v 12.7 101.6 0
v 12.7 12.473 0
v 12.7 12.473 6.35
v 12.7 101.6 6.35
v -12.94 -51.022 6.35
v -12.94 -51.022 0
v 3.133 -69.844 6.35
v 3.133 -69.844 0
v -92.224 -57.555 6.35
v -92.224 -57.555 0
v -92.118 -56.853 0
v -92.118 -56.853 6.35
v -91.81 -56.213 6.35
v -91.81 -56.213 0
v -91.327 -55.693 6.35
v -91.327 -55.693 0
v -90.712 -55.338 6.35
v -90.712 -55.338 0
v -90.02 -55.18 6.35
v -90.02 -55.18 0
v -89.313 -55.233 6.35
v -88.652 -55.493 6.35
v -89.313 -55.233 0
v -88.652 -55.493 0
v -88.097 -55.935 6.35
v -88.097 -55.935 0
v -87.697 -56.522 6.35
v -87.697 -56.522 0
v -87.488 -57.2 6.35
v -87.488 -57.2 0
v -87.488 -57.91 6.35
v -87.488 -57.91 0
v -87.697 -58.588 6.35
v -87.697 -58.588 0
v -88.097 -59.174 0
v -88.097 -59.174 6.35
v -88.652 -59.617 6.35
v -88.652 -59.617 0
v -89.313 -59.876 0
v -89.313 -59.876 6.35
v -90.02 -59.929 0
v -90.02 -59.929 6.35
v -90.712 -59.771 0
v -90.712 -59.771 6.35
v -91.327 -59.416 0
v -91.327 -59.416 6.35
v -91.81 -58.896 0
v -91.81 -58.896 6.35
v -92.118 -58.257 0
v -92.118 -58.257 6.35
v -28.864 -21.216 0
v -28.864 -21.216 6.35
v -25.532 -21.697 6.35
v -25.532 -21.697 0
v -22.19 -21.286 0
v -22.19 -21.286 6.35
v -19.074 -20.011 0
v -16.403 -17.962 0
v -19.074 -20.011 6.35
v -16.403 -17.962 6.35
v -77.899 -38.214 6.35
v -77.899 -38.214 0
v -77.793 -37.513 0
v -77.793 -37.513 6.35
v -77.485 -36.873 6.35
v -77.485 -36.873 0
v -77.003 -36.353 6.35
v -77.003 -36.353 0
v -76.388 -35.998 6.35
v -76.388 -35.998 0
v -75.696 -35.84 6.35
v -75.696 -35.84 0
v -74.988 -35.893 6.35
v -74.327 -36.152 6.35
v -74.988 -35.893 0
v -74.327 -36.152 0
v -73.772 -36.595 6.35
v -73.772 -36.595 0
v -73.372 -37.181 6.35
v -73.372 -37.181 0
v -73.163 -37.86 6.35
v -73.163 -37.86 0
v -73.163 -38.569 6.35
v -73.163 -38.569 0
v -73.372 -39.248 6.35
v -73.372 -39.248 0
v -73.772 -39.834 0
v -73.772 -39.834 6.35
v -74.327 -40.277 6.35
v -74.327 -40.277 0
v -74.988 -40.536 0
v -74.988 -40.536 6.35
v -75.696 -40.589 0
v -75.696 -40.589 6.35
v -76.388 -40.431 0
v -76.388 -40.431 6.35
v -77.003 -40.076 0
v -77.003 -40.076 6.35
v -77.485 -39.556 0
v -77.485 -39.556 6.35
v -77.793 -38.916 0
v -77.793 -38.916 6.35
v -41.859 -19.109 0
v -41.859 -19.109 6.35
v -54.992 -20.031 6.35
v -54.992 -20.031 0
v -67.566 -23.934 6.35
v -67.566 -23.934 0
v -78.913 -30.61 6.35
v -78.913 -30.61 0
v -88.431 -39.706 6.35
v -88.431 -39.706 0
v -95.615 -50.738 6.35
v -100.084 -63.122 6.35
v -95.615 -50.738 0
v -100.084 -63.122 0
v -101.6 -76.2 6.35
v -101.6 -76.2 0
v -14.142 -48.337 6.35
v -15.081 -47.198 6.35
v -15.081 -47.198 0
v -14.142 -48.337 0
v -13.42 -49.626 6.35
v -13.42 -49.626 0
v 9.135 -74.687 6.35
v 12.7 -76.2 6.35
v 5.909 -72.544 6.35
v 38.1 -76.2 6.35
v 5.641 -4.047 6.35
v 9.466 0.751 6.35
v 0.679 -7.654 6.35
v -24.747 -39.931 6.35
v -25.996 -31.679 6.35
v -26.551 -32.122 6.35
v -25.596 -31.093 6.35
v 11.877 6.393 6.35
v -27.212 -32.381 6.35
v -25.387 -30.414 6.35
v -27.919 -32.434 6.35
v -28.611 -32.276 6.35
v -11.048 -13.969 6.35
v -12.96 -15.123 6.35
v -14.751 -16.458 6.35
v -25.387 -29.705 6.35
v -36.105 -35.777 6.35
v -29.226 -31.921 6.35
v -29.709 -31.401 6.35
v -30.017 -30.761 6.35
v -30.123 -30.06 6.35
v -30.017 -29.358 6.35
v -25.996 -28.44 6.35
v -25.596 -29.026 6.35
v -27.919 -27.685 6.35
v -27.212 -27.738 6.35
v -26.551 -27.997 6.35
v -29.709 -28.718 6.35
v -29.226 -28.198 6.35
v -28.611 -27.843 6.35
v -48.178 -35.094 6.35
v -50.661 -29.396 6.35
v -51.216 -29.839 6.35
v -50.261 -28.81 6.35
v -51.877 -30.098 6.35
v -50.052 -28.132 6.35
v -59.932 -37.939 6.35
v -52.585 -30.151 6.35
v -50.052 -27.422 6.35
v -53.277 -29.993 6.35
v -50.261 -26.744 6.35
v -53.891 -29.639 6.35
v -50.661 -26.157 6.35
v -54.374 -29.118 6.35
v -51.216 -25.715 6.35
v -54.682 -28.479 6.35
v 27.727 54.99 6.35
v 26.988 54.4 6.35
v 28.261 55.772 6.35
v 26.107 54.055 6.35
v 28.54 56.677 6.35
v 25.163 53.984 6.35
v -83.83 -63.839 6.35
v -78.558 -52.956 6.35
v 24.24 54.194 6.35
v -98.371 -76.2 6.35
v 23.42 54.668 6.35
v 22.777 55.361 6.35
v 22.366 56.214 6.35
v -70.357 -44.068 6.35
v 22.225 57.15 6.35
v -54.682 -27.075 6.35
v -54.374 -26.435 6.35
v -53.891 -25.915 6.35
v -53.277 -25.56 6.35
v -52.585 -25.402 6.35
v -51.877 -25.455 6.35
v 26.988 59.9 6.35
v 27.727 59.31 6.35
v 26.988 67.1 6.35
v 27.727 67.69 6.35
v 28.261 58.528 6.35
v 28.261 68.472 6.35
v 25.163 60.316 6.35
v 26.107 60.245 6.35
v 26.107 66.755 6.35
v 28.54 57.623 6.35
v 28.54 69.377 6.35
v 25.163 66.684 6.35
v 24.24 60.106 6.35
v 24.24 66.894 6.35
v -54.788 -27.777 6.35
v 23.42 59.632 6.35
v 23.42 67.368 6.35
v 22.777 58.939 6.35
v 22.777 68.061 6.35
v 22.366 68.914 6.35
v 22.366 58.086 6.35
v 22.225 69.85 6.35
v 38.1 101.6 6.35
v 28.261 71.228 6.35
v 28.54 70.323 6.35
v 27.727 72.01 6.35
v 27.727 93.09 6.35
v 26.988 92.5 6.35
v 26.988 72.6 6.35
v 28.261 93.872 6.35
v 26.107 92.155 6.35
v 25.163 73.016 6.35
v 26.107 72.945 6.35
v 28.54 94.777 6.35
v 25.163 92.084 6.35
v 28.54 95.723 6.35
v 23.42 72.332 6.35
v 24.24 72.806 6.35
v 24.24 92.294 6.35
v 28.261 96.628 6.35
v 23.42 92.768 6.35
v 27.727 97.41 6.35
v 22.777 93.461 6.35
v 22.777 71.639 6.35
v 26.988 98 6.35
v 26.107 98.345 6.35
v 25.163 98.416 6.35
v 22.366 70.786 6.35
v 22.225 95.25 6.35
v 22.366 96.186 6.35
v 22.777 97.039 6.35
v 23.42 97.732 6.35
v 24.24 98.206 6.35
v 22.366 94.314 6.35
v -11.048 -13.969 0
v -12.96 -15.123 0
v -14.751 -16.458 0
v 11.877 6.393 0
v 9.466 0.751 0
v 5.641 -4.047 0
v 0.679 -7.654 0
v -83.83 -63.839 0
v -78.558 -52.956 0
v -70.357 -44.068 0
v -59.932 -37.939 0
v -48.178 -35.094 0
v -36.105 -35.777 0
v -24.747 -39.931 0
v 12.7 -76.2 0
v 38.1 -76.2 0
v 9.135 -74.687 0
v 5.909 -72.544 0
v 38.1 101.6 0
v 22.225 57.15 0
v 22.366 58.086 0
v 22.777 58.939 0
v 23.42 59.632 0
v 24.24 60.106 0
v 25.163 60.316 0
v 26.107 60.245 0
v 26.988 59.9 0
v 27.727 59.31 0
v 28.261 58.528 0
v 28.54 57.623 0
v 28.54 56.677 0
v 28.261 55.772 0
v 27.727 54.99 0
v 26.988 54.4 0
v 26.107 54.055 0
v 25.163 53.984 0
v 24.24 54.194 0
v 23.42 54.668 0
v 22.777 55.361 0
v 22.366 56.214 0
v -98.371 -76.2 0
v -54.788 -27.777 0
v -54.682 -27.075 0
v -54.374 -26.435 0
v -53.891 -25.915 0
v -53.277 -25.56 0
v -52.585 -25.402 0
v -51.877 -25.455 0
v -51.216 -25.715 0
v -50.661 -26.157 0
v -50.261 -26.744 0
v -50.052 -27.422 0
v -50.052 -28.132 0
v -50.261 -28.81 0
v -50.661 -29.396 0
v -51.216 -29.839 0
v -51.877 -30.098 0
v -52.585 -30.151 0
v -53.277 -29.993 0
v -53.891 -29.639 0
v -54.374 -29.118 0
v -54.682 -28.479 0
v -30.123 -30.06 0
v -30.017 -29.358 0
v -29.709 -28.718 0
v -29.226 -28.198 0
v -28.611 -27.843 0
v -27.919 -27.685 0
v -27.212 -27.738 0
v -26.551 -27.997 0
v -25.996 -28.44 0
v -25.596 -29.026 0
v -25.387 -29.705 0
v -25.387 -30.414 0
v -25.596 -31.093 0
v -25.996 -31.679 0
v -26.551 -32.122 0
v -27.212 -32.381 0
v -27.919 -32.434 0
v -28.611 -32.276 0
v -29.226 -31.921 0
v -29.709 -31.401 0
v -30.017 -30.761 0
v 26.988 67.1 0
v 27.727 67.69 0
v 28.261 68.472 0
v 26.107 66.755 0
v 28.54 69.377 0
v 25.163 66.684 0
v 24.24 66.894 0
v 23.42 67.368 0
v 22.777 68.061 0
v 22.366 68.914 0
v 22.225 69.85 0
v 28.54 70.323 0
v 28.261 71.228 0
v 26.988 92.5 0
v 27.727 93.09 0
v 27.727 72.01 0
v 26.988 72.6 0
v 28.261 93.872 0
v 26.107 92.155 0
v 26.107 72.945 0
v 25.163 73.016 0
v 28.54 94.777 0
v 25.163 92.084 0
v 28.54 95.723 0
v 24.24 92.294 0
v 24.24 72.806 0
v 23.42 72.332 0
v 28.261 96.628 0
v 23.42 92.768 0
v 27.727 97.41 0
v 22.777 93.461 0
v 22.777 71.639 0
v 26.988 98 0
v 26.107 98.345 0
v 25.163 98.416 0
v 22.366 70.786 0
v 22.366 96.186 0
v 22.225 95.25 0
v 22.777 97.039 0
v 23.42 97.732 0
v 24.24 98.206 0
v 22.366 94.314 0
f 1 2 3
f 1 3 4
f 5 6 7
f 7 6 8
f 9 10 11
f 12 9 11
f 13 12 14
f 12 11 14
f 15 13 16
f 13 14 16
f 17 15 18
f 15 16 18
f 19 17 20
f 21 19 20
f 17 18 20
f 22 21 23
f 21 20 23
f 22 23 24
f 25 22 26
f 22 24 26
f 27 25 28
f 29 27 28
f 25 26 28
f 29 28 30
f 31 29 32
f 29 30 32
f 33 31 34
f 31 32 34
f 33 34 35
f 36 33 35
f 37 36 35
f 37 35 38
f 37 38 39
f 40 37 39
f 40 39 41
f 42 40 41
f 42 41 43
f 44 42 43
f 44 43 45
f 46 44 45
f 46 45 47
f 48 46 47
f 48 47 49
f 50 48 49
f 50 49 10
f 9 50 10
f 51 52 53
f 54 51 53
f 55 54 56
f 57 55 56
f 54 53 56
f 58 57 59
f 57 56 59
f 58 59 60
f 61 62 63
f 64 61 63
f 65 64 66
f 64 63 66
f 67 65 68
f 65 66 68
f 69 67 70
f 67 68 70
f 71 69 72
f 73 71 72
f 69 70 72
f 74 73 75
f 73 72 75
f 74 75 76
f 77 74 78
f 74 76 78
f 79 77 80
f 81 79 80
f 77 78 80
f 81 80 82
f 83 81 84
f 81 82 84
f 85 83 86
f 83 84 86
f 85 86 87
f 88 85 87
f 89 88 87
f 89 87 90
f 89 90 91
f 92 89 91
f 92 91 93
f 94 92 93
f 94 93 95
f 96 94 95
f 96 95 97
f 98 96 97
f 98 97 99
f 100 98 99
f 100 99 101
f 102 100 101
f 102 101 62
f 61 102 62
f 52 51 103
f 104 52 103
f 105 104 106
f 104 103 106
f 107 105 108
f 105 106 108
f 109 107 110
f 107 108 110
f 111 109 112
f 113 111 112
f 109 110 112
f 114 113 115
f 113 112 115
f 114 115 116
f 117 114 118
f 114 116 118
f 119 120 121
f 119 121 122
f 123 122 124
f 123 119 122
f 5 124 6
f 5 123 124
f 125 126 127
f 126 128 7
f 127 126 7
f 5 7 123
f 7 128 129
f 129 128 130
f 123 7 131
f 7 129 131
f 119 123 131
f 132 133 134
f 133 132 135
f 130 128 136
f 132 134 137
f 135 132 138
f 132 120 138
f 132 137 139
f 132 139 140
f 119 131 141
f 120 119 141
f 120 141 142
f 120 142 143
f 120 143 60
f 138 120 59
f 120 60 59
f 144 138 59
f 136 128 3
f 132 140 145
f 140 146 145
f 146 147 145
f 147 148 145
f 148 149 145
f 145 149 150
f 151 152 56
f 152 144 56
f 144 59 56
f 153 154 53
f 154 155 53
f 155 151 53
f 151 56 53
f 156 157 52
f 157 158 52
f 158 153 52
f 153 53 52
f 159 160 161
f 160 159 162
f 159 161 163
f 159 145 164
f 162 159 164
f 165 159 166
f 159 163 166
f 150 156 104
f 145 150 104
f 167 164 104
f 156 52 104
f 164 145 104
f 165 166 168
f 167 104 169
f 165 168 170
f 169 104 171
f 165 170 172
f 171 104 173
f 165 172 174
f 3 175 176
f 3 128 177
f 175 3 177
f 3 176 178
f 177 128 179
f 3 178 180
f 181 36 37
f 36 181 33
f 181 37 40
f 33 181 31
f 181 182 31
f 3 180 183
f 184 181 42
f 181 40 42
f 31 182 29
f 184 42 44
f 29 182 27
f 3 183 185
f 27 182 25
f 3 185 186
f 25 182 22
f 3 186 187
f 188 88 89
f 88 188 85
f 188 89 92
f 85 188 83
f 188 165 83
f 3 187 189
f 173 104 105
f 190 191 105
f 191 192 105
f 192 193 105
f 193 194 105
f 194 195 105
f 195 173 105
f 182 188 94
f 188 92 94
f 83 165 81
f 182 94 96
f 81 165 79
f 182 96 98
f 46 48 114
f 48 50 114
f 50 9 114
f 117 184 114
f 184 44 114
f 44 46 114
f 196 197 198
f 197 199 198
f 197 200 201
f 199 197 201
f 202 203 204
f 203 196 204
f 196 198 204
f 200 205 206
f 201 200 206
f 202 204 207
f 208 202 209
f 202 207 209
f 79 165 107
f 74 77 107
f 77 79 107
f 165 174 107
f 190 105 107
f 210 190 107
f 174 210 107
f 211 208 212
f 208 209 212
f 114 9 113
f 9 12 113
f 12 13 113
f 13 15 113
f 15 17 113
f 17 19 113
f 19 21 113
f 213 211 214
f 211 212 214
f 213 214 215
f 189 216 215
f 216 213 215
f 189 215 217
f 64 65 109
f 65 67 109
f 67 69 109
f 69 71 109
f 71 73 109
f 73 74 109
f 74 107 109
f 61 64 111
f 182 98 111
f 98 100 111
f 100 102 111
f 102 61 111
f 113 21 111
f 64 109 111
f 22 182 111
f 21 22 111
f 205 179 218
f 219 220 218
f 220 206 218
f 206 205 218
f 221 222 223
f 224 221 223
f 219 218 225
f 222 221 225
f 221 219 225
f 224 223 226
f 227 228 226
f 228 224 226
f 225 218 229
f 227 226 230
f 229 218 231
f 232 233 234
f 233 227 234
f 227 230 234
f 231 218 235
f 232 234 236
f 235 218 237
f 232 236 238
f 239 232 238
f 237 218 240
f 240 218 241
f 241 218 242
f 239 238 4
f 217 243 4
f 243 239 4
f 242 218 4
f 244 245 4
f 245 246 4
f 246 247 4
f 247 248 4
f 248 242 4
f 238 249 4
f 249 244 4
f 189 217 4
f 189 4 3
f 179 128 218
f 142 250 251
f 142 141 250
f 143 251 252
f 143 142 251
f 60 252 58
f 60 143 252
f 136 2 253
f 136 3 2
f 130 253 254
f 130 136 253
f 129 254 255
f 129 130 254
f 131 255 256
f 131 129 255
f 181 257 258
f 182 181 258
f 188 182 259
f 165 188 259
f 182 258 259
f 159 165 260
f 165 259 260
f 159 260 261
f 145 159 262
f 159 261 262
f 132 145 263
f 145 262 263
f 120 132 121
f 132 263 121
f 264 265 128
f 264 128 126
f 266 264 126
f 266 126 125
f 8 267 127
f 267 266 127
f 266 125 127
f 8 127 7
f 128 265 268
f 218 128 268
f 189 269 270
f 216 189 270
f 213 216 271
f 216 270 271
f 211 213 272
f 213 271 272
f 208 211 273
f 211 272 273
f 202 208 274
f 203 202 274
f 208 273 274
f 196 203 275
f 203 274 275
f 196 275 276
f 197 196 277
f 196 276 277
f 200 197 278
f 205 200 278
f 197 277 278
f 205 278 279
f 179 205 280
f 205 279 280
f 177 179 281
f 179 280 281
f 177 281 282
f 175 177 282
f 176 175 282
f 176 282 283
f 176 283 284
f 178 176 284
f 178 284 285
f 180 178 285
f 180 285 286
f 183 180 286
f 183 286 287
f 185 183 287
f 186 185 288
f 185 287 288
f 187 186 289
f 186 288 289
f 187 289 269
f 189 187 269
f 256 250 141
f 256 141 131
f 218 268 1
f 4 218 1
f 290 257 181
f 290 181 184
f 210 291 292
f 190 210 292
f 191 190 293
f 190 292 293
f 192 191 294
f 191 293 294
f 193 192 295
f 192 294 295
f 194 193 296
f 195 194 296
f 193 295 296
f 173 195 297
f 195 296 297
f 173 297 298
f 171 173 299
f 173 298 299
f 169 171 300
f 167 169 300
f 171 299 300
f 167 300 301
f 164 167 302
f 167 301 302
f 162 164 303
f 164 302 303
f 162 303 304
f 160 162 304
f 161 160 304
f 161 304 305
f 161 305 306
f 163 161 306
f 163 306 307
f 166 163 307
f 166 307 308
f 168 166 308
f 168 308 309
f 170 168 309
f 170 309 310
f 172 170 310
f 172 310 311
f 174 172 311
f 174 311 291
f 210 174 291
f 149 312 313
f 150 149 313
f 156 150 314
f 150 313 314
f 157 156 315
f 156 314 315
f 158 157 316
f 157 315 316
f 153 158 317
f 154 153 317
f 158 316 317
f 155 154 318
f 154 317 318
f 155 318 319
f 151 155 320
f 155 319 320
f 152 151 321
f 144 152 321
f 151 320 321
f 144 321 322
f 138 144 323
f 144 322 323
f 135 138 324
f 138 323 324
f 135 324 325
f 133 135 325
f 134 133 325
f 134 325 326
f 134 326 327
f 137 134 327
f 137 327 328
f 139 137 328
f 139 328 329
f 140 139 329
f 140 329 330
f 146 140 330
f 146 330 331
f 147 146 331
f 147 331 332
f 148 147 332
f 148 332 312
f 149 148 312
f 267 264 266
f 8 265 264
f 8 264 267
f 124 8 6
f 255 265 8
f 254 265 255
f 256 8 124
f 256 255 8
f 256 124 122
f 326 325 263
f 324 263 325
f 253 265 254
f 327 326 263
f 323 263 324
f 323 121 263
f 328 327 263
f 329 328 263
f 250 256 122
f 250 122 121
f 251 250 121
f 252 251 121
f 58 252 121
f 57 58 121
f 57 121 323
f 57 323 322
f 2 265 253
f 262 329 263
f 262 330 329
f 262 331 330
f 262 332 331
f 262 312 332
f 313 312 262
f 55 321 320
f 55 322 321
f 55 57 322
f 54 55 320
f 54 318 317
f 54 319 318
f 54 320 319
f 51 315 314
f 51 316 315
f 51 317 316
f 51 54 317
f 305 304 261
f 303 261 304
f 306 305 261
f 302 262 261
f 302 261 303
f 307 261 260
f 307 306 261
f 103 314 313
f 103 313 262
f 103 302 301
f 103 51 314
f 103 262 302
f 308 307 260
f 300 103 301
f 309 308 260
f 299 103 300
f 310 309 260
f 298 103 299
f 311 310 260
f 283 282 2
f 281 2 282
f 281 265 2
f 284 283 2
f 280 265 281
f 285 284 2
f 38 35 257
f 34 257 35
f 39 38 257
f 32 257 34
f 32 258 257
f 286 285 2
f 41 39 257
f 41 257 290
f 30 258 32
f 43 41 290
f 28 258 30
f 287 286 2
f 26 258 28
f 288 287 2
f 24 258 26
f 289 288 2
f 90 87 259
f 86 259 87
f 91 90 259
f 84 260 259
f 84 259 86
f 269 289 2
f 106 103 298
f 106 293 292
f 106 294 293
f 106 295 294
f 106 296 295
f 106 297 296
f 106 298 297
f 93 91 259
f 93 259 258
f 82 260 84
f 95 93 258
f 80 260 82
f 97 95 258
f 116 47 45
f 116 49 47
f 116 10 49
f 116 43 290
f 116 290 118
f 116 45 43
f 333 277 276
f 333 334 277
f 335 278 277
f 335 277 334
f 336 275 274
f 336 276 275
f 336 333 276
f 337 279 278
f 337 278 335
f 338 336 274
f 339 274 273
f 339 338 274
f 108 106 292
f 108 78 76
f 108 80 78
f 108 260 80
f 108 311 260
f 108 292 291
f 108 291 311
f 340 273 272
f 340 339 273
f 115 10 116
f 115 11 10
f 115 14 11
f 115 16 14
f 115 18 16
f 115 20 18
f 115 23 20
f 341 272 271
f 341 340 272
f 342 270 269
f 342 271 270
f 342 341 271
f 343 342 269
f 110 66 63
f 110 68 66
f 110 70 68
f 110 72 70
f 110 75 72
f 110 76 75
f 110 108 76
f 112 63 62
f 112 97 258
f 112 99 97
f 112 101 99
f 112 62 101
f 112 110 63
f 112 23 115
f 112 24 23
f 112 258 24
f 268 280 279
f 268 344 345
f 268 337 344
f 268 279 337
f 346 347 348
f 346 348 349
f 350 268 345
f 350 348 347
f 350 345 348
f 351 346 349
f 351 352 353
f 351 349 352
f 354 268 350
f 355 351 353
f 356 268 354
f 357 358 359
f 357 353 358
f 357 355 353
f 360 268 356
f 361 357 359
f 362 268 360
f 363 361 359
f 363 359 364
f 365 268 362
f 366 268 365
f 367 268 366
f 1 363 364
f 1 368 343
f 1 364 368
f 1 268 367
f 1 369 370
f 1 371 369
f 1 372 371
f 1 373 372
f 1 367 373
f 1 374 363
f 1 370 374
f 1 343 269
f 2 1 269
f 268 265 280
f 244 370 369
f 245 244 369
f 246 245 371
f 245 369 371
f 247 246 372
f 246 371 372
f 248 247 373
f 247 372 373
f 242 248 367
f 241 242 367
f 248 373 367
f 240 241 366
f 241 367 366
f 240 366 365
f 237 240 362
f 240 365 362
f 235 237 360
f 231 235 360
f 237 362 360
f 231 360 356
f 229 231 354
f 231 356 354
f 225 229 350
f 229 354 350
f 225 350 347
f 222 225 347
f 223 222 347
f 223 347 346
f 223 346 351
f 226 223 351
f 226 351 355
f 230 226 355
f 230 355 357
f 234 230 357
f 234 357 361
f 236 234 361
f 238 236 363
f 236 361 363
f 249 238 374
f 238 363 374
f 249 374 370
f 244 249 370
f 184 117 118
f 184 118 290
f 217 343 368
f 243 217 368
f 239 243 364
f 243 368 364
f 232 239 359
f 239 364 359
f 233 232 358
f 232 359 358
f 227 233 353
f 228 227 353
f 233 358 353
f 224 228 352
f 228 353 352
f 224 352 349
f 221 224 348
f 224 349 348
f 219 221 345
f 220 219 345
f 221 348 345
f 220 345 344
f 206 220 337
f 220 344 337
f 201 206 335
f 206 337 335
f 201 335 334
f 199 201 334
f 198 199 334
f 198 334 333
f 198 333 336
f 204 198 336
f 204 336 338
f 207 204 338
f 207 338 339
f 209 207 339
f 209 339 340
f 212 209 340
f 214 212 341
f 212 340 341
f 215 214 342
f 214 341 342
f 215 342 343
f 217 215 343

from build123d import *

# Parameters (mm, degrees)
BOSS_EXTRUDE1_DEPTH = 6.35
FILLET1_R           = 8.255
SKETCH2_R           = 3.175
CUT_EXTRUDE1_DEPTH  = 128.158650905
CHAMFER2_START      = -126.7457463
CHAMFER2_OUTLINE_W  = 36
CHAMFER2_OUTLINE_H  = 6.35
CHAMFER2_DEPTH      = 83.771913248
FILLET4_R           = 20.955
FILLET5_R           = 12.7
SKETCH3_W           = 25.4
SKETCH3_H           = 25.4
SKETCH3_R           = 3.175
BOSS_EXTRUDE2_DEPTH = 6.35
SKETCH4_W           = 25.4
SKETCH4_H           = 177.8
SKETCH4_R           = 3.175
BOSS_EXTRUDE3_DEPTH = 6.35
SKETCH5_W           = 25.4
SKETCH5_H           = 101.6
CUT_EXTRUDE2_DEPTH  = 144.824345992
CHAMFER3_DEPTH      = 6.35
FILLET7_R           = 22.86
SKETCH6_R           = 2.38125
CUT_EXTRUDE3_DEPTH  = 144.824345992


with BuildPart() as part:
    # Sketch1 → Boss-Extrude1 (new body)
    with BuildSketch(Plane.XY):
        with BuildLine():
            Line((12.7, 76.2), (-12.7, 76.2))
            Line((-12.7, 76.2), (-12.7, -28.680951188))
            ThreePointArc((-12.7, -28.680951188), (-71.390768363, -25.798437524), (-101.6, -76.2))
            Line((-101.6, -76.2), (-85.725, -76.2))
            ThreePointArc((-85.725, -76.2), (-58.470420375, -37.379213847), (-12.7, -49.826469235))
            Line((-12.7, -49.826469235), (-12.7, -76.2))
            Line((-12.7, -76.2), (12.7, -76.2))
            Line((12.7, -76.2), (12.7, 76.2))
        make_face()
    extrude(amount=BOSS_EXTRUDE1_DEPTH)

    # Fillet1
    fillet1_edges = [part.edges().sort_by_distance(p)[0] for p in [
        (-12.7, -49.826469235, 3.175),
    ]]
    fillet(fillet1_edges, radius=FILLET1_R)

    # Chamfer1
    # the kernel refuses this chamfer: 16.925734726, 15.24 mm, written as the material it takes off along each edge
    with BuildSketch(Plane(origin=(-85.725, -76.2, -32.922584323), x_dir=(0.15149402541241913, 0.9884581732498049, 0), z_dir=(0, 0, 1))) as chamfer1_piece_1:
        with BuildLine():
            Line((13.017434015, -0.44343203), (-2.4273823, 12.943386903))
            Line((-2.4273823, 12.943386903), (-2.761989917, 12.89210395))
            ThreePointArc((-2.761989917, 12.89210395), (-1.331569383, 6.453627085), (-0.334607617, -0.051282954))
            Line((-0.334607617, -0.051282954), (0.051282954, -0.334607617))
            ThreePointArc((0.051282954, -0.334607617), (6.510978775, 0.137060785), (12.966151061, -0.778039646))
            Line((12.966151061, -0.778039646), (13.017434015, -0.44343203))
        make_face()
    extrude(amount=72.195168646, mode=Mode.SUBTRACT)

    # Sketch2 → Cut-Extrude1 (cut, through all)
    with BuildSketch(Plane.XY.offset(6.35)):
        with Locations((0, 57.15)):
            Circle(SKETCH2_R)
        with Locations((0, 69.85)):
            Circle(SKETCH2_R)
    extrude(amount=-CUT_EXTRUDE1_DEPTH, mode=Mode.SUBTRACT)

    # Chamfer2: read off the stored shape, not the designer's step
    # Chamfer2 outline → Chamfer2 (cut)
    with BuildSketch(Plane(origin=(0, 0, 0), x_dir=(0.6493951635681026, -0.7604511302735748, 0), z_dir=(0.7604511302735747, 0.6493951635681027, 0)).offset(CHAMFER2_START)):
        with Locations((47, -3.175)):
            Rectangle(CHAMFER2_OUTLINE_W, CHAMFER2_OUTLINE_H)
    extrude(amount=CHAMFER2_DEPTH, mode=Mode.SUBTRACT)

    # Fillet4
    # the kernel refuses this fillet: 20.955 mm, written as the material it takes off along each edge
    with BuildSketch(Plane(origin=(8.560811014, -76.2, 27.244649936), x_dir=(1, 0, 0), z_dir=(0, 0, -1))) as fillet4_piece_1:
        with BuildLine():
            CenterArc((10.50769959, -19.963819717), FILLET4_R, 107.692818626, 31.811166067)
            Line((-5.427553845, -6.355744064), (-5.746258914, -6.083582551))
            Line((-5.746258914, -6.083582551), (-0.318705069, 0.272161513))
            Line((-0.318705069, 0.272161513), (0, 0.4191))
            ThreePointArc((0, 0.4191), (2.069594493, 0.4191), (4.011818774, 0.399276394))
            Line((4.011818774, 0.399276394), (4.139188986, 0))
        make_face()
    extrude(amount=48.139299873, mode=Mode.SUBTRACT)

    # Fillet5
    fillet5_edges = [part.edges().sort_by_distance(p)[0] for p in [
        (-12.7, -28.680951188, 3.175),
    ]]
    fillet(fillet5_edges, radius=FILLET5_R)

    # Sketch3 → Boss-Extrude2 (add)
    with BuildSketch(Plane.XY.offset(6.35)):
        with Locations((0, 88.9)):
            Rectangle(SKETCH3_W, SKETCH3_H)
        with Locations((0, 95.25)):
            Circle(SKETCH3_R, mode=Mode.SUBTRACT)
    extrude(amount=-BOSS_EXTRUDE2_DEPTH)

    # Sketch4 → Boss-Extrude3 (add)
    with BuildSketch(Plane(origin=(0, 0, 0), x_dir=(-1, 0, 0), z_dir=(0, 0, -1))):
        with Locations((-25.4, 12.7)):
            Rectangle(SKETCH4_W, SKETCH4_H)
        with Locations((-25.4, 95.25)):
            Circle(SKETCH4_R, mode=Mode.SUBTRACT)
        with Locations((-25.4, 69.85)):
            Circle(SKETCH4_R, mode=Mode.SUBTRACT)
        with Locations((-25.4, 57.15)):
            Circle(SKETCH4_R, mode=Mode.SUBTRACT)
    extrude(amount=-BOSS_EXTRUDE3_DEPTH)

    # Sketch5 → Cut-Extrude2 (cut, through all)
    with BuildSketch(Plane(origin=(0, 0, 0), x_dir=(-1, 0, 0), z_dir=(0, 0, -1))):
        with Locations((0, 50.8)):
            Rectangle(SKETCH5_W, SKETCH5_H)
    extrude(amount=-CUT_EXTRUDE2_DEPTH, mode=Mode.SUBTRACT)

    # Chamfer3: read off the stored shape, not the designer's step
    # Chamfer3 outline → Chamfer3 (cut)
    with BuildSketch(Plane.XY):
        with BuildLine():
            ThreePointArc((-12.7, -8.997916699), (-13.235467867, -12.646773779), (-14.796717794, -15.98793862))
            Line((-14.796717794, -15.98793862), (12.7, -1.180669249))
            Line((12.7, -1.180669249), (12.7, 0))
            Line((12.7, 0), (-12.7, 0))
            Line((-12.7, 0), (-12.7, -8.997916699))
        make_face()
    extrude(amount=CHAMFER3_DEPTH, mode=Mode.SUBTRACT)

    # Fillet7
    fillet7_edges = [part.edges().sort_by_distance(p)[0] for p in [
        (-14.796717794, -15.98793862, 3.175),
        (12.7, -1.180669249, 3.175),
    ]]
    fillet(fillet7_edges, radius=FILLET7_R)

    # Sketch6 → Cut-Extrude3 (cut, through all)
    with BuildSketch(Plane(origin=(0, 0, 0), x_dir=(-1, 0, 0), z_dir=(0, 0, -1))):
        with Locations((89.842397197, -57.554736727)):
            Circle(SKETCH6_R)
        with Locations((75.517874882, -38.214440689)):
            Circle(SKETCH6_R)
        with Locations((52.406792333, -27.776813182)):
            Circle(SKETCH6_R)
        with Locations((27.741530006, -30.059534069)):
            Circle(SKETCH6_R)
    extrude(amount=-CUT_EXTRUDE3_DEPTH, mode=Mode.SUBTRACT)


solid = part.part
